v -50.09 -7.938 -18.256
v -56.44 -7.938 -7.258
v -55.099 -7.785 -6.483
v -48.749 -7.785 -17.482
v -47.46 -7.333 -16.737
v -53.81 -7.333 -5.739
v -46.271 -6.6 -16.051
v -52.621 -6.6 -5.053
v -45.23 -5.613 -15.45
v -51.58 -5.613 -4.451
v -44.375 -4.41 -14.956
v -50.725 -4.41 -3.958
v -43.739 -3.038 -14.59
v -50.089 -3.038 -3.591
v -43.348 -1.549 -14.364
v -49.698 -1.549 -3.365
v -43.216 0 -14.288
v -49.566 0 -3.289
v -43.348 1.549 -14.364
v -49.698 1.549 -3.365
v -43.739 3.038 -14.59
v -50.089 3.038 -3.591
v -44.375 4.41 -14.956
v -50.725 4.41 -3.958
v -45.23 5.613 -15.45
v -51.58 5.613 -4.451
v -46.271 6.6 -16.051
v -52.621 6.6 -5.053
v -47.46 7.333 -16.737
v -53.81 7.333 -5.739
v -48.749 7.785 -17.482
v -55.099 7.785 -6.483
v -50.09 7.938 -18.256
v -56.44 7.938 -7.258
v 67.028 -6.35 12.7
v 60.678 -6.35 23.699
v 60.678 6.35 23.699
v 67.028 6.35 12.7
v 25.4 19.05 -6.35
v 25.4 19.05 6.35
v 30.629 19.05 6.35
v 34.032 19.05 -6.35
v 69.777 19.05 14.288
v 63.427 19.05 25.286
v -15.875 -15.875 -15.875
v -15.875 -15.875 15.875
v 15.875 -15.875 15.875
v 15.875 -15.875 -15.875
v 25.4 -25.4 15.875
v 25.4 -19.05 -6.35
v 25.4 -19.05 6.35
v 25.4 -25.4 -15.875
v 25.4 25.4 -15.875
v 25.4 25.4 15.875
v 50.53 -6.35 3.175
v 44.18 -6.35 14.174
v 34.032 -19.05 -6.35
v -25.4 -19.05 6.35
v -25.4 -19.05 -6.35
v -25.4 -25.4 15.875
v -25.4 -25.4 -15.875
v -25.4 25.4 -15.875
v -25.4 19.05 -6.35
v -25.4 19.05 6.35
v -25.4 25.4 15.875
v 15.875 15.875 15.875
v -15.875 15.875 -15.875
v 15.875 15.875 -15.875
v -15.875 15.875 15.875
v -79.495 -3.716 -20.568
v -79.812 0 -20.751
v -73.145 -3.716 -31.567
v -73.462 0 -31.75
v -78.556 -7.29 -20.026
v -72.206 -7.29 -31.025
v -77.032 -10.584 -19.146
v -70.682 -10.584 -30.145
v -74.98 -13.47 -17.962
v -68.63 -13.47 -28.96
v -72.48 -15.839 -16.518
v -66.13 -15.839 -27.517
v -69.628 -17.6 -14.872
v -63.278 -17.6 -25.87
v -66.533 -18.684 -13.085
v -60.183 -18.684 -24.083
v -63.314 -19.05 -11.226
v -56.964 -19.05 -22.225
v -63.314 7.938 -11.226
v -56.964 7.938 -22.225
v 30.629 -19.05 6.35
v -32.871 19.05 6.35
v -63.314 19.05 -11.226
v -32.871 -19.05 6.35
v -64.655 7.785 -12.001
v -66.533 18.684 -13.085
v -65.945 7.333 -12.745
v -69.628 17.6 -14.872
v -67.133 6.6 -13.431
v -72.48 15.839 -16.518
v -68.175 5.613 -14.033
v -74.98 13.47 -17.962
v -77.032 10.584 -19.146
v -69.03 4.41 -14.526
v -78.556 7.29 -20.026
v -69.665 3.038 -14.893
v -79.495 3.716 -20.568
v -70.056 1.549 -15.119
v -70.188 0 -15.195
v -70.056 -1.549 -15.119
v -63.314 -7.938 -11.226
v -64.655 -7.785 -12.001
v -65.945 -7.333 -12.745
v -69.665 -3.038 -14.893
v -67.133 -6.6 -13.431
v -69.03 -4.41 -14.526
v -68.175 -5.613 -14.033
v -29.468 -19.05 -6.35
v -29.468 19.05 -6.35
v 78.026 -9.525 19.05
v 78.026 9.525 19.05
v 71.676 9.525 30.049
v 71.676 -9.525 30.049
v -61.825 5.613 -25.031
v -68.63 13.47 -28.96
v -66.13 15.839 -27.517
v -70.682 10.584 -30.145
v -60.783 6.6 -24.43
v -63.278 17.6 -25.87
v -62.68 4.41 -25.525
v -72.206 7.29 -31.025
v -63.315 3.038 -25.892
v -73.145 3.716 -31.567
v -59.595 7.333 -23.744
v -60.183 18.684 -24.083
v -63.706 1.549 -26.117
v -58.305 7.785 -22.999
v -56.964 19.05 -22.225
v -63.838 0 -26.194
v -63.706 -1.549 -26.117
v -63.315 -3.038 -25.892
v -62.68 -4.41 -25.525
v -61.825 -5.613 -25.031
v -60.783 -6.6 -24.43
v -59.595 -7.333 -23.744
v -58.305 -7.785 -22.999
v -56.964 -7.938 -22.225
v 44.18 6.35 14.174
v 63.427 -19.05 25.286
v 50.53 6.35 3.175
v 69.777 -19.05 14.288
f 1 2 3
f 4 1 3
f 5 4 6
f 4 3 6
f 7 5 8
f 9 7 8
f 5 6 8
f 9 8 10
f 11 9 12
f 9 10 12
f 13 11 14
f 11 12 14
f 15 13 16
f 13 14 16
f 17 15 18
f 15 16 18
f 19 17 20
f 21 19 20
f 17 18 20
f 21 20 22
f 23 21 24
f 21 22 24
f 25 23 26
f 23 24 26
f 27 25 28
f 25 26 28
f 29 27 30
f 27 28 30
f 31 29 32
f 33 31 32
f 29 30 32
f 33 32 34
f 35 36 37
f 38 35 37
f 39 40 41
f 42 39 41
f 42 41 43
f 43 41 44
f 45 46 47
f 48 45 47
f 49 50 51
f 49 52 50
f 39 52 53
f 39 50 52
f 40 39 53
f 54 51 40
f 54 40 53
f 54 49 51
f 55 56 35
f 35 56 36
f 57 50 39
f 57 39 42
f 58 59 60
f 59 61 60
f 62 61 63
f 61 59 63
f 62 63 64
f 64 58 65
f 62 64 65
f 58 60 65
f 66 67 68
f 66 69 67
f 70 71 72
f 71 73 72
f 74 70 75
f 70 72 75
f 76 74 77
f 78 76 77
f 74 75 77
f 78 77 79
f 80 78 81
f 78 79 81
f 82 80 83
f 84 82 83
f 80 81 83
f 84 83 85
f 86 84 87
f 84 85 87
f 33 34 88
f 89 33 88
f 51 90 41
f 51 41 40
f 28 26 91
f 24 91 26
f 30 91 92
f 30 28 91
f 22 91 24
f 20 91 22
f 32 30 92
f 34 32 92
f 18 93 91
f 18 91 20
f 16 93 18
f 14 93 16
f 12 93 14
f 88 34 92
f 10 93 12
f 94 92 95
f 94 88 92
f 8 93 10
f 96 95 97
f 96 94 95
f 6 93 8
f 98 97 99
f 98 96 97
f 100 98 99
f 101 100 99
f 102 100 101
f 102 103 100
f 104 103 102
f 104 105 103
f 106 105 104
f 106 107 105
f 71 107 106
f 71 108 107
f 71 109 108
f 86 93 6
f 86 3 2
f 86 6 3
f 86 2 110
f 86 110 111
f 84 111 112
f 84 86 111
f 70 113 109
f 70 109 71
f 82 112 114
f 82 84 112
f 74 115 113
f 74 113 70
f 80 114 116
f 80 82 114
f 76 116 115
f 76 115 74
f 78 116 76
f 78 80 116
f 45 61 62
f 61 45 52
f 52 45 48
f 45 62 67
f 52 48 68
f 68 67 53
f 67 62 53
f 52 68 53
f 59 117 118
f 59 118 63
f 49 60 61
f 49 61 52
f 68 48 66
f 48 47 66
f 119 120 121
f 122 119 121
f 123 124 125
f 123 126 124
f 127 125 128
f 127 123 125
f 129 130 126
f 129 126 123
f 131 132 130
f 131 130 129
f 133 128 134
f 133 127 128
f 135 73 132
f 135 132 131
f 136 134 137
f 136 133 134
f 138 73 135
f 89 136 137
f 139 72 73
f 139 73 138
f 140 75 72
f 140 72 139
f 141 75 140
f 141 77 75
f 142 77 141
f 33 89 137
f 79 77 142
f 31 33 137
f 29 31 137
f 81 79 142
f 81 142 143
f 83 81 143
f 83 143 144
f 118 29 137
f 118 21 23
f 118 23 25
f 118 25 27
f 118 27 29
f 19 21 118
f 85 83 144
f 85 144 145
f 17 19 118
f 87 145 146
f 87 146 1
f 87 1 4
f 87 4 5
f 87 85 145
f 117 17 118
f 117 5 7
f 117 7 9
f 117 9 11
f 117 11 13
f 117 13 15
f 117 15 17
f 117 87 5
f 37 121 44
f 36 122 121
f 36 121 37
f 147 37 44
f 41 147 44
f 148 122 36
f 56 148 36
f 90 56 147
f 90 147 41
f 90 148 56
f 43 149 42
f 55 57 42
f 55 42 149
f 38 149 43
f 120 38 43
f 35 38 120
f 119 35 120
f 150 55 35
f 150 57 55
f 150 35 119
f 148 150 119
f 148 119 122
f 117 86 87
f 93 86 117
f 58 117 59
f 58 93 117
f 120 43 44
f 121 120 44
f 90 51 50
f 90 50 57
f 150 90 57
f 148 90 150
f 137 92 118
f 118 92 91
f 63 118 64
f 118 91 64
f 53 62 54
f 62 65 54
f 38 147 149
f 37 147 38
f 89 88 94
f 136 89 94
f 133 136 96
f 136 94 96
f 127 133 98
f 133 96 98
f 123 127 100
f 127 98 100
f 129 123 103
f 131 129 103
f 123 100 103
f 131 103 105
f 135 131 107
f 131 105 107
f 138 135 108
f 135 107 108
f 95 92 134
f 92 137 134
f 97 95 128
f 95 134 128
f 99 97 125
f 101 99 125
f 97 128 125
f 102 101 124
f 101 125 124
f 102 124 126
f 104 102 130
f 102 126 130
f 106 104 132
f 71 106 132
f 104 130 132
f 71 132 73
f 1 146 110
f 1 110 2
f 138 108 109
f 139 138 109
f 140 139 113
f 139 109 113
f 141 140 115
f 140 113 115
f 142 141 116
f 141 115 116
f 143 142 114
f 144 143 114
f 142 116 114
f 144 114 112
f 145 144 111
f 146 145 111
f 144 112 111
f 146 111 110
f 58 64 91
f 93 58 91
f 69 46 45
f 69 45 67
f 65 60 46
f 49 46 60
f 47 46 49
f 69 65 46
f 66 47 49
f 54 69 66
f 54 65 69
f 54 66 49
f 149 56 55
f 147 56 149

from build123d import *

# Parameters (mm, degrees)
F0_W      = 50.8
F0_H      = 50.8
F0_W_2    = 31.75
F0_H_2    = 31.75
F1_DEPTH  = 15.875
F3_DEPTH  = 19.05
F5_DEPTH  = 25.4
F6_R      = 19.04999
F7_W      = 19.05
F7_H      = 12.7
F8_DEPTH  = 56.6950905122
F9_SIZE   = 9.525
F10_DEPTH = 38.101


# Not quite as in the source:
# - a fillet or chamfer is up to 0.001 mm smaller than in the source, because OpenCascade refuses the exact size


with BuildPart() as f1:
    # F0 (on Top) → F1 (new body, symmetric)
    with BuildSketch(Plane.XY):
        Rectangle(F0_W, F0_H)
        Rectangle(F0_W_2, F0_H_2, mode=Mode.SUBTRACT)
    extrude(amount=F1_DEPTH, both=True)

    # F2 (on Front) → F3 (join, symmetric)
    with BuildSketch(Plane.XZ):
        Polygon((-73.4620968847, -31.75), (-29.4680063725, -6.35), (34.0319936275, -6.35), (78.0260841398, 19.05), (71.6760841398, 30.0485226281), (30.6290388837, 6.35), (-32.8709611163, 6.35), (-79.8120968847, -20.7514773719), align=None)
    extrude(amount=F3_DEPTH, both=True)

    # F4 (on face) → F5 (cut)
    with BuildSketch(Plane(origin=(-10.9673709361, 0, 18.9960436868), x_dir=(0.8660254038, 0, 0.5), z_dir=(-0.5, 0, 0.8660254038))):
        with BuildLine():
            Line((-52.5075421174, 7.9375), (-60.4450421174, 7.9375))
            ThreePointArc((-60.4450421174, 7.9375), (-66.0577021931, 5.6126600757), (-68.3825421174, 0))
            ThreePointArc((-68.3825421174, 0), (-66.0577021931, -5.6126600757), (-60.4450421174, -7.9375))
            Line((-60.4450421174, -7.9375), (-52.5075421174, -7.9375))
            ThreePointArc((-52.5075421174, -7.9375), (-44.5700421174, 0), (-52.5075421174, 7.9375))
        make_face()
    extrude(amount=-F5_DEPTH, mode=Mode.SUBTRACT)

    # F6 (radius 19.05 in the source; OpenCascade refuses exactly that, so slightly less here)
    f6_edges = [f1.edges().sort_by_distance(p)[0] for p in [
        (-76.637097, -19.05, -26.250739),
        (-76.637097, 19.05, -26.250739),
    ]]
    fillet(f6_edges, radius=F6_R)

    # F7 (on face) → F8 (cut, through all)
    with BuildSketch(Plane(origin=(4.9076290639, 0, -8.5002628834), x_dir=(0.8660254038, 0, 0.5), z_dir=(-0.5, 0, 0.8660254038))):
        with Locations((54.8725710229, 0)):
            Rectangle(F7_W, F7_H)
    extrude(amount=-F8_DEPTH, mode=Mode.SUBTRACT)

    # F9
    f9_edges = [f1.edges().sort_by_distance(p)[0] for p in [
        (74.851084, 19.05, 24.549261),
        (74.851084, -19.05, 24.549261),
    ]]
    chamfer(f9_edges, length=F9_SIZE)

    # F10 (cut, through all): a face of the model
    f10_faces = [f1.faces().sort_by_distance(p)[0] for p in [
        (0, 0, 6.35),
    ]]
    extrude(f10_faces, amount=-F10_DEPTH, mode=Mode.SUBTRACT)


solid = f1.part
